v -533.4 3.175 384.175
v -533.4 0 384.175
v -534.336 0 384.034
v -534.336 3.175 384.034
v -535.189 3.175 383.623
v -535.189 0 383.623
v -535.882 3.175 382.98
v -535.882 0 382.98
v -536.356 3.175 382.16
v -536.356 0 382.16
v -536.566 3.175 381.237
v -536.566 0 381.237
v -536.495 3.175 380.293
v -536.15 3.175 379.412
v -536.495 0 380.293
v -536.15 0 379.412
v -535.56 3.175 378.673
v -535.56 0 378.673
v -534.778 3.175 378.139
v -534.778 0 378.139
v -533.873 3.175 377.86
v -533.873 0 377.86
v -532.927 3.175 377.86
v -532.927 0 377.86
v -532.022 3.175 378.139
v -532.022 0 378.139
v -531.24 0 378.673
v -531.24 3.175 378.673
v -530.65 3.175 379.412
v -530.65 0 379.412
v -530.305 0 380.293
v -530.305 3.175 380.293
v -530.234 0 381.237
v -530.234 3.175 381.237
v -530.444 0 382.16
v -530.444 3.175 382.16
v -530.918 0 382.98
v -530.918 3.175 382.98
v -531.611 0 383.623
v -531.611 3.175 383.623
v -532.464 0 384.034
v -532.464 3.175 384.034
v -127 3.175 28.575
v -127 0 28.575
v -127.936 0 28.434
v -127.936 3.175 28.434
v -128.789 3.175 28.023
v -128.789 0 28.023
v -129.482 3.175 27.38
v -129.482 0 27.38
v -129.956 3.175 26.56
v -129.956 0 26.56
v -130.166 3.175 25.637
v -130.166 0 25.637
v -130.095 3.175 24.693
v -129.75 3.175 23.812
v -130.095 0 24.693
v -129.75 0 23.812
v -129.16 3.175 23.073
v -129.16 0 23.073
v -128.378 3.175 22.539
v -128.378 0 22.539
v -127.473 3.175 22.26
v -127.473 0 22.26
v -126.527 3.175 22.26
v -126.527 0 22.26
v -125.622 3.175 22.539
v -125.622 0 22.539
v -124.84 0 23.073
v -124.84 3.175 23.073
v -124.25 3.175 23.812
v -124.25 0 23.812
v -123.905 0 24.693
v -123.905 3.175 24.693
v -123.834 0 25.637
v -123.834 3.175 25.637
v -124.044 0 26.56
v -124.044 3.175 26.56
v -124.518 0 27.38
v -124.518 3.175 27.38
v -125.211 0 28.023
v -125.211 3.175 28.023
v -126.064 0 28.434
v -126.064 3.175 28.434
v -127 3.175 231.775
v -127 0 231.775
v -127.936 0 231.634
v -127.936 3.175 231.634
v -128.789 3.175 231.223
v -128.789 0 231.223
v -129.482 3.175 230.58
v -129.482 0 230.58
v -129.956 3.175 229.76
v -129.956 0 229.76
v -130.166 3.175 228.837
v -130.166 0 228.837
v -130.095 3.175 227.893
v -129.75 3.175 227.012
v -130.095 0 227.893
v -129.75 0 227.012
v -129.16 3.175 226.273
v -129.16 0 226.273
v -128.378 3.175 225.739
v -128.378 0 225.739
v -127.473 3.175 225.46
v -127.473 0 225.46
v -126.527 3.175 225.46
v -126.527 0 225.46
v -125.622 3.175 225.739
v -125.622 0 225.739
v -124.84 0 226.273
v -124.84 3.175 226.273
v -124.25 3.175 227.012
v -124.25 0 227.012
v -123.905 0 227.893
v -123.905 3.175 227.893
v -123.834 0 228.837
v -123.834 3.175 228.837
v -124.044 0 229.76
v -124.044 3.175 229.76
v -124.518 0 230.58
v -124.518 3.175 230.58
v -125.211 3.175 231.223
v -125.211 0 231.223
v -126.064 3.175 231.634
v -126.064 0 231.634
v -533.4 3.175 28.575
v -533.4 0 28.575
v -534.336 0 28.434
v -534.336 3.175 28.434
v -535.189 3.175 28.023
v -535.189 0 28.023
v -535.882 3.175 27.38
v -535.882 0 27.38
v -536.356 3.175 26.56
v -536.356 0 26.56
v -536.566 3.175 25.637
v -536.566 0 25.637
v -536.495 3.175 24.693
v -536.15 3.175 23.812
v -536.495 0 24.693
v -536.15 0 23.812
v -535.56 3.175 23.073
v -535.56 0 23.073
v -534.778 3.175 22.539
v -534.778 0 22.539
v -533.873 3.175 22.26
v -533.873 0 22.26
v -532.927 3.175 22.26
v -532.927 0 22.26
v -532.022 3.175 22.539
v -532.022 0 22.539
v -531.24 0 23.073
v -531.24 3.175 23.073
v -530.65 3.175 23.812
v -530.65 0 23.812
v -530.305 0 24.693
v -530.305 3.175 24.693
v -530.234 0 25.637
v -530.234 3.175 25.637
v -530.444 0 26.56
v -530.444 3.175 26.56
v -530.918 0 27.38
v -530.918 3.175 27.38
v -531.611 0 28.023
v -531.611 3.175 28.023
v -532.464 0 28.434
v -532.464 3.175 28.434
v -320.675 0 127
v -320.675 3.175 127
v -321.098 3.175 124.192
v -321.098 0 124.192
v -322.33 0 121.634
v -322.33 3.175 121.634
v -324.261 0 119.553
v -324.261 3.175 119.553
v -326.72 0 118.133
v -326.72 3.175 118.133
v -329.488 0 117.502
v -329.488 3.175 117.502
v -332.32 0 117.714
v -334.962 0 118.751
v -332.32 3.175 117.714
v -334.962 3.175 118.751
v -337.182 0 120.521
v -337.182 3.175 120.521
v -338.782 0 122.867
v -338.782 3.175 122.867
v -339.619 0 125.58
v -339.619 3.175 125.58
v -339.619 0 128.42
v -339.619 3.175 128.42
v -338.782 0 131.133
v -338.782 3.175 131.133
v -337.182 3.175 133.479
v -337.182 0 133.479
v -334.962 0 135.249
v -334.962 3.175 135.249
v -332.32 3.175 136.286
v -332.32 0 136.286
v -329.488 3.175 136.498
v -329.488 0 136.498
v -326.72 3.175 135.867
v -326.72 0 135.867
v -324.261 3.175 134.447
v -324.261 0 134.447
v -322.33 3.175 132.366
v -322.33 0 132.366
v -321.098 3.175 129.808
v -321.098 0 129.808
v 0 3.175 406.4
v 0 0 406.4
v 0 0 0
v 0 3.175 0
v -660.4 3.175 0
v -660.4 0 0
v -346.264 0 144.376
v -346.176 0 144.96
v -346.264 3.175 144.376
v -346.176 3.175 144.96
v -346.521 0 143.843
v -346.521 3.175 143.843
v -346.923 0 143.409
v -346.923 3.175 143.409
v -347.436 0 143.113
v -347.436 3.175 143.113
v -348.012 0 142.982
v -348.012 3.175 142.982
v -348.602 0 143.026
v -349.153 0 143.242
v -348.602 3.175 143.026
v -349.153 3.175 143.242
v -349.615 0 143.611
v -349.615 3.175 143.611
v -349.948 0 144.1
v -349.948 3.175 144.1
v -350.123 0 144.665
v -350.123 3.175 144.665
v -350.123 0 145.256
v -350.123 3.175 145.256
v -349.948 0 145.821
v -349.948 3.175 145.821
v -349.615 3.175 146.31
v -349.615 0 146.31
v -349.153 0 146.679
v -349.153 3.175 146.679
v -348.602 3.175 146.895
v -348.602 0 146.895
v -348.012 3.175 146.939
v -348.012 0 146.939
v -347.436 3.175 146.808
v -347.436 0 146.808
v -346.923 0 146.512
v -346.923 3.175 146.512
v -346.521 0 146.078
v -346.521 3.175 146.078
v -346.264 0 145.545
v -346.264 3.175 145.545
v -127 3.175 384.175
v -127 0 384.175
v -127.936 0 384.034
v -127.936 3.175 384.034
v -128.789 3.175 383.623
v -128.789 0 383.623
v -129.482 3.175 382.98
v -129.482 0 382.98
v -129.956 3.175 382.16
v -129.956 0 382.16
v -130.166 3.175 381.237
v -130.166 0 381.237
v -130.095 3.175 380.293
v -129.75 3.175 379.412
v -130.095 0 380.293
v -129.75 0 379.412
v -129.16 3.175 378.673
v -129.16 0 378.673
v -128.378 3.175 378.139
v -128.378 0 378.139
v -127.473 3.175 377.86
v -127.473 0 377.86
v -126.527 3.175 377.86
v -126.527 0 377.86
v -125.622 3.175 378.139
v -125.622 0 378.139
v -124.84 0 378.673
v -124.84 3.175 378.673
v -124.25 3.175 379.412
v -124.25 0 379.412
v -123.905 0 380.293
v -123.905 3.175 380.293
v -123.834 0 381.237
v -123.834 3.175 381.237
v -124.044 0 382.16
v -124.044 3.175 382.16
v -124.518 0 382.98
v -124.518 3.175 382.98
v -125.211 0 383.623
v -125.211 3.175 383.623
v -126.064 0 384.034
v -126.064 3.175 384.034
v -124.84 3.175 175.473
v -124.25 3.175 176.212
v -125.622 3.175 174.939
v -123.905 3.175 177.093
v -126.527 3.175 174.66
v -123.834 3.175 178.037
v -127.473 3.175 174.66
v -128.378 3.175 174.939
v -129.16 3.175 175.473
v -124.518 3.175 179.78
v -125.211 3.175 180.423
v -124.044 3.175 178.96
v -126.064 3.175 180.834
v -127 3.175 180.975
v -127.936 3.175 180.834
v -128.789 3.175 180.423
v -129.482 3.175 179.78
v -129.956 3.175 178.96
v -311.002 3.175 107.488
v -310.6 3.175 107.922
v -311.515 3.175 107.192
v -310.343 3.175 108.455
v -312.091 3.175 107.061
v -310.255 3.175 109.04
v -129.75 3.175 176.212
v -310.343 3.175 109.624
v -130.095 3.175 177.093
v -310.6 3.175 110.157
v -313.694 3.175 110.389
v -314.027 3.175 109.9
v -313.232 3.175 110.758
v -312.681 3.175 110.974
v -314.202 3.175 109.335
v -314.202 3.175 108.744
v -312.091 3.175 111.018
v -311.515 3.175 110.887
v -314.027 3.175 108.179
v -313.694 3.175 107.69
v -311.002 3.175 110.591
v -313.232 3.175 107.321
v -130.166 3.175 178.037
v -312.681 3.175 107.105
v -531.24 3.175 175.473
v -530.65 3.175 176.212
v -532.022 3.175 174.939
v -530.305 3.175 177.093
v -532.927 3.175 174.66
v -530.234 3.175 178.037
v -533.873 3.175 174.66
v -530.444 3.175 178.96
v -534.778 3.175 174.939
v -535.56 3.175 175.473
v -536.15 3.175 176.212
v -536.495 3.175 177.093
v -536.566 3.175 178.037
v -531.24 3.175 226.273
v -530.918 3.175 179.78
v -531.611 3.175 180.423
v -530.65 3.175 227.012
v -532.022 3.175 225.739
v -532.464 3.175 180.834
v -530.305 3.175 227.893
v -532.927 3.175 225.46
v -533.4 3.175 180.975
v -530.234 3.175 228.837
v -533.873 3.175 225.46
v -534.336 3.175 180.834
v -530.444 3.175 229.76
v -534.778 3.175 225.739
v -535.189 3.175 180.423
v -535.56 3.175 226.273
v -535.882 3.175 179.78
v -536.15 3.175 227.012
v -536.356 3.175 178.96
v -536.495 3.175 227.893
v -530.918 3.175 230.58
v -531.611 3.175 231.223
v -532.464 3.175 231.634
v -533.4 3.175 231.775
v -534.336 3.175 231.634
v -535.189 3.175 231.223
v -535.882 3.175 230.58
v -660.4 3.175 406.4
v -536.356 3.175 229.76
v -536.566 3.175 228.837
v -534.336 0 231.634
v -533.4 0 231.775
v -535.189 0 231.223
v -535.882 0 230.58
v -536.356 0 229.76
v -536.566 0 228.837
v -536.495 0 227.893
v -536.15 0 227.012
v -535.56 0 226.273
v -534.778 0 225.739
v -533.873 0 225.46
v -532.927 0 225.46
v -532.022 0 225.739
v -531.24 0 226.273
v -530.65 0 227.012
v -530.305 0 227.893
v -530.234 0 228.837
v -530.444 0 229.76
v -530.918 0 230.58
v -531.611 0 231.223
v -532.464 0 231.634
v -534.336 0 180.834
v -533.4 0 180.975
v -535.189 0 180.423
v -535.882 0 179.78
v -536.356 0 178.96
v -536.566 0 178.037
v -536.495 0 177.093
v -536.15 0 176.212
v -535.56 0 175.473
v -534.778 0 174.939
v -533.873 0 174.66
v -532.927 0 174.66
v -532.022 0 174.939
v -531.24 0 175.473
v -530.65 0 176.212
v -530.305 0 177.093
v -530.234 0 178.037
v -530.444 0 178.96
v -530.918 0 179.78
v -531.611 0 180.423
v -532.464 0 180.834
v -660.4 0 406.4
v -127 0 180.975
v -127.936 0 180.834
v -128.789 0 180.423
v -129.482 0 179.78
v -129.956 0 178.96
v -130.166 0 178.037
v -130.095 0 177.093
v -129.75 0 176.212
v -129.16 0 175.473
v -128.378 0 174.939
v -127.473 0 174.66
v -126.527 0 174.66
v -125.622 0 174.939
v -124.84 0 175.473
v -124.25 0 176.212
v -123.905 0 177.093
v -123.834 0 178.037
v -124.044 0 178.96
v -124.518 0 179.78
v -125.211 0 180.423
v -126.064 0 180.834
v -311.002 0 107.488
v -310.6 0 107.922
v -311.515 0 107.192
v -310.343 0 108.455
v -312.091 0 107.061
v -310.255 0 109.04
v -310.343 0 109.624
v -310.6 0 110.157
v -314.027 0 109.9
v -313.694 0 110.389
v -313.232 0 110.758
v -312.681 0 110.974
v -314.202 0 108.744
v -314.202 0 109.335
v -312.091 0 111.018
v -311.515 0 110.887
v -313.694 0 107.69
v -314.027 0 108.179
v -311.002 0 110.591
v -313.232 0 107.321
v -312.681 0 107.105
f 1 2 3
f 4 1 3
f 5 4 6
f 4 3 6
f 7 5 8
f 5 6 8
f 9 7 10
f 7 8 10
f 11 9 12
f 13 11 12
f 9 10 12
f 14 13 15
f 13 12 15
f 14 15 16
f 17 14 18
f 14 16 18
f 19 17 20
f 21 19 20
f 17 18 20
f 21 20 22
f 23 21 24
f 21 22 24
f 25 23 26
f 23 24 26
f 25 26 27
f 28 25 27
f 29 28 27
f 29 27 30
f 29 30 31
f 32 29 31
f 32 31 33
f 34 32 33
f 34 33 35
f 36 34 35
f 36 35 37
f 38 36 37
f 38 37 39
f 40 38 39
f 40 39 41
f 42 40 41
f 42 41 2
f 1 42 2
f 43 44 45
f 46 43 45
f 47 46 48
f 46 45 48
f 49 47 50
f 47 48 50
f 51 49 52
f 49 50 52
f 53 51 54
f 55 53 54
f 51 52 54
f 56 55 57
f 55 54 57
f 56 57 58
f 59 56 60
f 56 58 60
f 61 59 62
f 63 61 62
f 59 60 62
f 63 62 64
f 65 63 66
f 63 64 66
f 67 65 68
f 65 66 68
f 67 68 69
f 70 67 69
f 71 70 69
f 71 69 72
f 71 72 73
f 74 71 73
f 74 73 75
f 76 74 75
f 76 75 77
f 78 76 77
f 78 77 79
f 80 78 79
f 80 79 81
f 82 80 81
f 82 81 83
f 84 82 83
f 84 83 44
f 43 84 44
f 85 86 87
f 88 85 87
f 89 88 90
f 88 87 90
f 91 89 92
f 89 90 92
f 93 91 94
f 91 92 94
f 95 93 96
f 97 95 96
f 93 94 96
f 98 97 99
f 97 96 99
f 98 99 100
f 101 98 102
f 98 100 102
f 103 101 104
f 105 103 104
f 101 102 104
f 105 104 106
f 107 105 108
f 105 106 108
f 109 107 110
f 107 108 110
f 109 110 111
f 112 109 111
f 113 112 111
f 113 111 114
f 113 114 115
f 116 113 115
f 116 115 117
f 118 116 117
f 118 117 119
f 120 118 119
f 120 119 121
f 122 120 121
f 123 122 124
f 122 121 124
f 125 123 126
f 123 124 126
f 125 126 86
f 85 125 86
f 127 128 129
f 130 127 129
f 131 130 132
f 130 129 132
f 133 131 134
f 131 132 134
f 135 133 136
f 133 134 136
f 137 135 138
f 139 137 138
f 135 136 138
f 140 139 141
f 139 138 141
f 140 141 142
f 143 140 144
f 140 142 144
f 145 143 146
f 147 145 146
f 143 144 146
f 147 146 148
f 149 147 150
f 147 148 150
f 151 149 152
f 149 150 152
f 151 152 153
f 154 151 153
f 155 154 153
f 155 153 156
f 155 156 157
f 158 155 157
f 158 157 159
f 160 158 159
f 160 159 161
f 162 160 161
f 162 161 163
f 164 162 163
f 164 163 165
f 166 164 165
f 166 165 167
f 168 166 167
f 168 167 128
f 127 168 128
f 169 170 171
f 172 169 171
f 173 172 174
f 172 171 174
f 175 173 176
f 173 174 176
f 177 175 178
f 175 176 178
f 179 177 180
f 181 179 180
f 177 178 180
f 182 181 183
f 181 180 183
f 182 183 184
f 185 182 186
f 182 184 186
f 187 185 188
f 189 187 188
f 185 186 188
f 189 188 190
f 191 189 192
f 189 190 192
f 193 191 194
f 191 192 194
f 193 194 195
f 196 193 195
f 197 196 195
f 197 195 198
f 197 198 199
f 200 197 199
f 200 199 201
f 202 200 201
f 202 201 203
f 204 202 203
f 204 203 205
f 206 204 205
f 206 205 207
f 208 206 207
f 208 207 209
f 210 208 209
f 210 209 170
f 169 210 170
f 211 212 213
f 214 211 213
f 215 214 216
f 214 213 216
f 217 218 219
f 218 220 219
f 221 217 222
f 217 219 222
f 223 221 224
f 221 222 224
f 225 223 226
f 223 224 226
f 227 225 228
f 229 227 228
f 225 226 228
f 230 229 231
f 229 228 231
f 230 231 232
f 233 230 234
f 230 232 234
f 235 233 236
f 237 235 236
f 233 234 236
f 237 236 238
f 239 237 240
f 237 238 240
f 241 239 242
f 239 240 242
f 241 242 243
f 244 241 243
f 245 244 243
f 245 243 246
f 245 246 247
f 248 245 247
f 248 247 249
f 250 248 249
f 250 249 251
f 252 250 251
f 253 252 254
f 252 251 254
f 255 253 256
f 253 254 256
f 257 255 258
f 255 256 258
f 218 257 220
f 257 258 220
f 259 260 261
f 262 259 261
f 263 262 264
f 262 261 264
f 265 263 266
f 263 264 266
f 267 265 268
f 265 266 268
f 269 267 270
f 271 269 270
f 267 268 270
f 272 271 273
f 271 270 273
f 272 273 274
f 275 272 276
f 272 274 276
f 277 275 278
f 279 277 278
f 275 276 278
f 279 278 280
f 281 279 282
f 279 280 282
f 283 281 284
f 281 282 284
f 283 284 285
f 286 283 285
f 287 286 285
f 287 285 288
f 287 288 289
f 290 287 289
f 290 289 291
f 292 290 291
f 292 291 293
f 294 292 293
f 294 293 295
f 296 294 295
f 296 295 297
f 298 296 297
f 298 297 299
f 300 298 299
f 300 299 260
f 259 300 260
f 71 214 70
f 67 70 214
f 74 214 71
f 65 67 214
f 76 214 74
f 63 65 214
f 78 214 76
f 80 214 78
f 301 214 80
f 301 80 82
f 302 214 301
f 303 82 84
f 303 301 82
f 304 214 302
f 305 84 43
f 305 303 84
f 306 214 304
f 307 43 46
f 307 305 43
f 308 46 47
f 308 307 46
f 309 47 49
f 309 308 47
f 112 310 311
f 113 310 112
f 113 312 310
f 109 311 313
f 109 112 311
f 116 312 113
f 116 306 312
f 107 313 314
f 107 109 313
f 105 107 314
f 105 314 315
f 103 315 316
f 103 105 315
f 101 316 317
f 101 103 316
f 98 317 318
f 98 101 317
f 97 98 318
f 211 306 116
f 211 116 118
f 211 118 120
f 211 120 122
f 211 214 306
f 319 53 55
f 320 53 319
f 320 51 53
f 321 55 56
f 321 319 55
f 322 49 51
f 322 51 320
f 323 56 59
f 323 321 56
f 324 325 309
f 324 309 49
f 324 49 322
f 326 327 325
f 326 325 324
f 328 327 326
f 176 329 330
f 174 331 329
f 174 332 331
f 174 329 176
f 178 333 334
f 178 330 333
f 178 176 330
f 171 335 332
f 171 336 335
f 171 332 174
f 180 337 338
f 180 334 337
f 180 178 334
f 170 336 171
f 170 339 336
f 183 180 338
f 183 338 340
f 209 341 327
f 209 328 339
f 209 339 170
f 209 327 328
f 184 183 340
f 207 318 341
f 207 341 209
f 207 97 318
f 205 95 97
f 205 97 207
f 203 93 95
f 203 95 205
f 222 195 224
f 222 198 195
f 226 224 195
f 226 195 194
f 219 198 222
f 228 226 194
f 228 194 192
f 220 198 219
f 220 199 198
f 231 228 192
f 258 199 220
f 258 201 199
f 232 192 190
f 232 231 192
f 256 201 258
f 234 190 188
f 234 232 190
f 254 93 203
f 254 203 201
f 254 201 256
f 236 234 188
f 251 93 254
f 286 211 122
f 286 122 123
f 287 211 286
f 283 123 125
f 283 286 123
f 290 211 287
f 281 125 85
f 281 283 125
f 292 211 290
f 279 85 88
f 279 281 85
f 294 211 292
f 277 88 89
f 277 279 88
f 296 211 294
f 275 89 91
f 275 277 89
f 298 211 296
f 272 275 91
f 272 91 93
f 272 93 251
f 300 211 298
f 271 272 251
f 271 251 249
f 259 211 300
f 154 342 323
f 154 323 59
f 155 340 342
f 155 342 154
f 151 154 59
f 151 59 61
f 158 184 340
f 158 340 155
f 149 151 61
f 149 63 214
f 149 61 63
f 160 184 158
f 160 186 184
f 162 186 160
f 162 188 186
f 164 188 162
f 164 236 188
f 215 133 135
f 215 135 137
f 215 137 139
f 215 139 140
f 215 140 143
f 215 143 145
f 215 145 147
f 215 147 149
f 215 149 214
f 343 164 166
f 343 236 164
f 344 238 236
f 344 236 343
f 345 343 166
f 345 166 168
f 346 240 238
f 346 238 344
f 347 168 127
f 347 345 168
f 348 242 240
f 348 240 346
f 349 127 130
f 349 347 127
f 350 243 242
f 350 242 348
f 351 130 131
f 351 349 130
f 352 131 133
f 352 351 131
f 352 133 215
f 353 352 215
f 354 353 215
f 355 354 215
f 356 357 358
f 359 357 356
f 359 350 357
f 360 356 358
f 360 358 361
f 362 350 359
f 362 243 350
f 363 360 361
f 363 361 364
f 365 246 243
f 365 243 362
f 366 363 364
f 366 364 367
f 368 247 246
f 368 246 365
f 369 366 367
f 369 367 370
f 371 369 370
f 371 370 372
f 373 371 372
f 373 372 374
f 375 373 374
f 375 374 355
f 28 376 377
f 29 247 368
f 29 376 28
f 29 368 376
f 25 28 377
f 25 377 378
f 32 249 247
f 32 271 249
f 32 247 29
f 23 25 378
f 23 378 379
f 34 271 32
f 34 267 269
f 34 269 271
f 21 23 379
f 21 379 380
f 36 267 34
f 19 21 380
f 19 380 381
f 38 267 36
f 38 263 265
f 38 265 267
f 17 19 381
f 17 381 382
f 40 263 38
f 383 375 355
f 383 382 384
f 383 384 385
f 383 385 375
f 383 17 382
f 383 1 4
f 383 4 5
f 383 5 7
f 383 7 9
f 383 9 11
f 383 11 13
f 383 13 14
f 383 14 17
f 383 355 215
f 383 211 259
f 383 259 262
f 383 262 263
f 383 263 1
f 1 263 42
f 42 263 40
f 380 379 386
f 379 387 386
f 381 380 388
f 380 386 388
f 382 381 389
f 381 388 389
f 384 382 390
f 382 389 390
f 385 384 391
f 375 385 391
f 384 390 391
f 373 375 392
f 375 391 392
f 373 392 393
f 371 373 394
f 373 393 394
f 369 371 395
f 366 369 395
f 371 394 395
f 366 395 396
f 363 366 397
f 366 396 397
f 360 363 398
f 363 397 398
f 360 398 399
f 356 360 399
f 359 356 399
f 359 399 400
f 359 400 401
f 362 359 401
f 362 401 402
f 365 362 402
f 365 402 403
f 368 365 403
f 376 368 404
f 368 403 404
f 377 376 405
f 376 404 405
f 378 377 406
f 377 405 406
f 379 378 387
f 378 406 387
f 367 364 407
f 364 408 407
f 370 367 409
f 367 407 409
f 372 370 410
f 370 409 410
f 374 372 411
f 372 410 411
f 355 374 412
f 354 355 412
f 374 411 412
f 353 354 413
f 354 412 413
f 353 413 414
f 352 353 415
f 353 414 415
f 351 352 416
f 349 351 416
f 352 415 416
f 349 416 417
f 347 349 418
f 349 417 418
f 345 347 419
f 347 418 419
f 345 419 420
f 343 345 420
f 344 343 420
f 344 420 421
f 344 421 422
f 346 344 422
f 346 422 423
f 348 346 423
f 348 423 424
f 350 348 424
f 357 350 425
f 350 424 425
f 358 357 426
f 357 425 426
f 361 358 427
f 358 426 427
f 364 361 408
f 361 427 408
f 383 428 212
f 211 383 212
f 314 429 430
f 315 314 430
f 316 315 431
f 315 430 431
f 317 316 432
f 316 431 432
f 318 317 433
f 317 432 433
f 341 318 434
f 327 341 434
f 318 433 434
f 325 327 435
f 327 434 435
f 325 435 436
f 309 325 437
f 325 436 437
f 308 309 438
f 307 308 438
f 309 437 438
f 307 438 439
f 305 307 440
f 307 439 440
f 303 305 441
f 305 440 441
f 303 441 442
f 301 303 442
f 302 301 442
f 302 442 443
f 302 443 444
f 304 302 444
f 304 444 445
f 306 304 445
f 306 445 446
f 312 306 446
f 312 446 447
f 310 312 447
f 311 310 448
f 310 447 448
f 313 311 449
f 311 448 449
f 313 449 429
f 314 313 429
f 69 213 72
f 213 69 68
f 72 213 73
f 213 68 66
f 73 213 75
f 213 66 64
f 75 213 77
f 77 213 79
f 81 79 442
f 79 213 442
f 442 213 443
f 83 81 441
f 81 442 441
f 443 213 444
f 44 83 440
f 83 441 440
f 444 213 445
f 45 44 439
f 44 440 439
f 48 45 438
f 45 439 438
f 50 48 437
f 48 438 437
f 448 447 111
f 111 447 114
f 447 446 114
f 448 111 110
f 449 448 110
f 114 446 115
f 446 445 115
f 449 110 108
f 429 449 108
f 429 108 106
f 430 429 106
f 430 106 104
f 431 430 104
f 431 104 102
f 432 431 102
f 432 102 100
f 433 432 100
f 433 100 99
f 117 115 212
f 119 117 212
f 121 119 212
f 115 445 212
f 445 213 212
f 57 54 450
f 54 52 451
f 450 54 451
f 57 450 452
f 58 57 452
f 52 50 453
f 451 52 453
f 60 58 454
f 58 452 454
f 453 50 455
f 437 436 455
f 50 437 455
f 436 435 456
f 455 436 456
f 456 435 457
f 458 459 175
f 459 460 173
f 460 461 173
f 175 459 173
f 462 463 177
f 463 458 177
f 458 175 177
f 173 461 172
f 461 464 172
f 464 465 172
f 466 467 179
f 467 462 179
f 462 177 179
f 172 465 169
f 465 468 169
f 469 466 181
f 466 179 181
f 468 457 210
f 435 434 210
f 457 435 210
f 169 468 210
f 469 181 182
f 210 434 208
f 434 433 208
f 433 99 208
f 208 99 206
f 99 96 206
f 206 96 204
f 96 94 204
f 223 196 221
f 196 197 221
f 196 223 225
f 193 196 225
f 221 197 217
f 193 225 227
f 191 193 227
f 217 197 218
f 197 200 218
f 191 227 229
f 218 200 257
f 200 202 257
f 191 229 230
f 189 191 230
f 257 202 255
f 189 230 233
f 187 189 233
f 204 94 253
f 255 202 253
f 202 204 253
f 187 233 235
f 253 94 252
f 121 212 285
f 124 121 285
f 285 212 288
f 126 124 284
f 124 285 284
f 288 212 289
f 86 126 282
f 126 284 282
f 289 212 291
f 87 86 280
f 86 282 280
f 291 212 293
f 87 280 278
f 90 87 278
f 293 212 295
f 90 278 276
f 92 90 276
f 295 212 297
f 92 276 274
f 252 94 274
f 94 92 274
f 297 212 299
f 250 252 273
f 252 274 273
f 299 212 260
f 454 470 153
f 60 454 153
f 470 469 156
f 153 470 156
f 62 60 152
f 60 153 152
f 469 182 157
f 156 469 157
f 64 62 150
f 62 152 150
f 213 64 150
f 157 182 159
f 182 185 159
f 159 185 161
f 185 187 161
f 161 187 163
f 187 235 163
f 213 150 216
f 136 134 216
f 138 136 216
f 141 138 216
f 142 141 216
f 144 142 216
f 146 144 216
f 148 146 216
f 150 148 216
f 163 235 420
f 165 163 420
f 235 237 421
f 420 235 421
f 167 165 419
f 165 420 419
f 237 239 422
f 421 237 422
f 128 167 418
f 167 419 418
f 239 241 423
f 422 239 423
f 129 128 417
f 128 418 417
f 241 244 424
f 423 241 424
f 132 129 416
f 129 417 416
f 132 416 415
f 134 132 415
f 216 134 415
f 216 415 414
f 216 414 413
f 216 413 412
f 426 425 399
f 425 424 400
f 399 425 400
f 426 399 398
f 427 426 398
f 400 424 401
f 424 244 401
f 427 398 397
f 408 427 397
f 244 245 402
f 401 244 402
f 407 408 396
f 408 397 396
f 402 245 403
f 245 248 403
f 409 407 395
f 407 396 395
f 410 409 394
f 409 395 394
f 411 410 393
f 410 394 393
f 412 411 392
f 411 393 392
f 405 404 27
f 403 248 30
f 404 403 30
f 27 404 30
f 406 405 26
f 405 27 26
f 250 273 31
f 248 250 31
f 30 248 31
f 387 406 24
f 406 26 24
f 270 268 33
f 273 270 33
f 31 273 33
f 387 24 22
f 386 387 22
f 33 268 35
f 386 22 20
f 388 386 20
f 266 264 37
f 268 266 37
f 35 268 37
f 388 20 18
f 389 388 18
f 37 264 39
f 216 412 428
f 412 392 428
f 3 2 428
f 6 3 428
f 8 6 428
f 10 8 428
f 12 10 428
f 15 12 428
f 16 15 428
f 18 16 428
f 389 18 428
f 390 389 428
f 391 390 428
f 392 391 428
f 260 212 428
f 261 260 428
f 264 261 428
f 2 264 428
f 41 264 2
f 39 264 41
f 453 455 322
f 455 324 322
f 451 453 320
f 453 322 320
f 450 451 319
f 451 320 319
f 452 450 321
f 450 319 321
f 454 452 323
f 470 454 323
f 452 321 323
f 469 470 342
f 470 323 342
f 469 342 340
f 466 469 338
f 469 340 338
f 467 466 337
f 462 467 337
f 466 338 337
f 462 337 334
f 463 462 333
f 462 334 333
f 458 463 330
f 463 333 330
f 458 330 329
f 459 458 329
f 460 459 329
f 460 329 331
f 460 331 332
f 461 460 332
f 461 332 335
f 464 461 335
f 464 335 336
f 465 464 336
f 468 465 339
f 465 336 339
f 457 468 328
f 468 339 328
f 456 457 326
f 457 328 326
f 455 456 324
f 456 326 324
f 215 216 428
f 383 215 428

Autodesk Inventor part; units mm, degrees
ref_plane "YZ Plane" through (0, 0, 0) normal (1, 0, 0) x (0, 1, 0)
ref_plane "XZ Plane" through (0, 0, 0) normal (0, 1, 0) x (-1, 0, 0)
ref_plane "XY Plane" through (0, 0, 0) normal (0, 0, 1) x (1, 0, 0)
sketch "Sketch1" plane through (0, 0, 0) normal (0, 1, 0) x (-1, 0, 0)
  line L0 (0, 0) -> (660.4, 0)
  line L1 (660.4, 0) -> (660.4, 406.4)
  line L2 (660.4, 406.4) -> (0, 406.4)
  line L3 (0, 406.4) -> (0, 0)
  dimension "d0" = 660.4
  dimension "d1" = 406.4
extrude "Extrusion1" add sketch "Sketch1" along normal blind 3.175
sketch "Sketch2" plane through (0, 3.175, 0) normal (0, 1, 0) x (1, 0, 0)
  line L0 (0, 0) -> (-660.4, 0) projected
  line L1 (-660.4, 0) -> (-660.4, -406.4) projected
  line L2 (-660.4, -406.4) -> (0, -406.4) projected
  line L3 (0, -406.4) -> (0, 0) projected
  point P0 (-127, -381)
  point P1 (-533.4, -381)
  point P2 (-533.4, -25.4)
  point P3 (-127, -25.4)
  dimension "d4" = 127
  dimension "d5" = 127
  dimension "d6" = 127
  dimension "d7" = 127
  dimension "d8" = 25.4
  dimension "d9" = 25.4
  dimension "d10" = 25.4
  dimension "d11" = 25.4
hole "Hole1" at (-127, 3.175, 381) at (-533.4, 3.175, 381) at (-533.4, 3.175, 25.4) at (-127, 3.175, 25.4) direction (0, -1, 0) diameter 6.35 end through all
sketch "Sketch3" plane through (0, 3.175, 0) normal (0, 1, 0) x (1, 0, 0)
  circle A0 centre (-533.4, -25.4) radius 3.175 projected
  circle A1 centre (-127, -381) radius 3.175 projected
  circle A2 centre (-533.4, -381) radius 3.175 projected
  circle A3 centre (-127, -25.4) radius 3.175 projected
  line L0 (0, 0) -> (-660.4, 0) projected
  line L1 (-660.4, 0) -> (-660.4, -406.4) projected
  line L2 (-660.4, -406.4) -> (0, -406.4) projected
  line L3 (0, -406.4) -> (0, 0) projected
  point P0 (-127, -228.6)
  point P1 (-127, -177.8)
  point P2 (-533.4, -177.8)
  point P3 (-533.4, -228.6)
  dimension "d19" = 177.8
  dimension "d20" = 177.8
  dimension "d21" = 177.8
  dimension "d22" = 177.8
  dimension "d23" = 127
  dimension "d24" = 127
  dimension "d25" = 127
  dimension "d26" = 127
hole "Hole2" at (-127, 3.175, 228.6) at (-127, 3.175, 177.8) at (-533.4, 3.175, 177.8) at (-533.4, 3.175, 228.6) direction (0, -1, 0) diameter 6.35 end through all
sketch "Sketch4" plane through (0, 3.175, 0) normal (0, 1, 0) x (1, 0, 0)
  circle A0 centre (-533.4, -177.8) radius 3.175 projected
  circle A1 centre (-127, -228.6) radius 3.175 projected
  circle A2 centre (-127, -177.8) radius 3.175 projected
  circle A3 centre (-533.4, -228.6) radius 3.175 projected
  circle A4 centre (-533.4, -25.4) radius 3.175 projected
  circle A5 centre (-127, -381) radius 3.175 projected
  circle A6 centre (-533.4, -381) radius 3.175 projected
  circle A7 centre (-127, -25.4) radius 3.175 projected
  line L0 (0, 0) -> (-660.4, 0) projected
  line L1 (-660.4, 0) -> (-660.4, -406.4) projected
  line L2 (-660.4, -406.4) -> (0, -406.4) projected
  line L3 (0, -406.4) -> (0, 0) projected
  circle A8 centre (-330.2, -127) radius 9.525
  line L4 (-330.2, -127) -> (-348.1605, -144.9605) construction
  line L5 (-330.2, -127) -> (-304.8, -127) construction
  line L6 (-330.2, -127) -> (-312.2395, -109.0395) construction
  line L7 (-330.2, -127) -> (-304.8, -127) construction
  circle A9 centre (-348.1605, -144.9605) radius 1.9844
  circle A10 centre (-312.2395, -109.0395) radius 1.9844
  dimension "d34" = 19.05
  dimension "d35" = 127
  dimension "d36" = 330.2
  dimension "d37" = 25.4
  dimension "d38" = 135
  dimension "d39" = 25.4
  dimension "d40" = 45
  dimension "d41" = 3.9688
  dimension "d42" = 3.9688
extrude "Extrusion2" cut sketch "Sketch4" against normal blind 3.175 contours A8 | A9 | A10
properties part number "lift plate"
